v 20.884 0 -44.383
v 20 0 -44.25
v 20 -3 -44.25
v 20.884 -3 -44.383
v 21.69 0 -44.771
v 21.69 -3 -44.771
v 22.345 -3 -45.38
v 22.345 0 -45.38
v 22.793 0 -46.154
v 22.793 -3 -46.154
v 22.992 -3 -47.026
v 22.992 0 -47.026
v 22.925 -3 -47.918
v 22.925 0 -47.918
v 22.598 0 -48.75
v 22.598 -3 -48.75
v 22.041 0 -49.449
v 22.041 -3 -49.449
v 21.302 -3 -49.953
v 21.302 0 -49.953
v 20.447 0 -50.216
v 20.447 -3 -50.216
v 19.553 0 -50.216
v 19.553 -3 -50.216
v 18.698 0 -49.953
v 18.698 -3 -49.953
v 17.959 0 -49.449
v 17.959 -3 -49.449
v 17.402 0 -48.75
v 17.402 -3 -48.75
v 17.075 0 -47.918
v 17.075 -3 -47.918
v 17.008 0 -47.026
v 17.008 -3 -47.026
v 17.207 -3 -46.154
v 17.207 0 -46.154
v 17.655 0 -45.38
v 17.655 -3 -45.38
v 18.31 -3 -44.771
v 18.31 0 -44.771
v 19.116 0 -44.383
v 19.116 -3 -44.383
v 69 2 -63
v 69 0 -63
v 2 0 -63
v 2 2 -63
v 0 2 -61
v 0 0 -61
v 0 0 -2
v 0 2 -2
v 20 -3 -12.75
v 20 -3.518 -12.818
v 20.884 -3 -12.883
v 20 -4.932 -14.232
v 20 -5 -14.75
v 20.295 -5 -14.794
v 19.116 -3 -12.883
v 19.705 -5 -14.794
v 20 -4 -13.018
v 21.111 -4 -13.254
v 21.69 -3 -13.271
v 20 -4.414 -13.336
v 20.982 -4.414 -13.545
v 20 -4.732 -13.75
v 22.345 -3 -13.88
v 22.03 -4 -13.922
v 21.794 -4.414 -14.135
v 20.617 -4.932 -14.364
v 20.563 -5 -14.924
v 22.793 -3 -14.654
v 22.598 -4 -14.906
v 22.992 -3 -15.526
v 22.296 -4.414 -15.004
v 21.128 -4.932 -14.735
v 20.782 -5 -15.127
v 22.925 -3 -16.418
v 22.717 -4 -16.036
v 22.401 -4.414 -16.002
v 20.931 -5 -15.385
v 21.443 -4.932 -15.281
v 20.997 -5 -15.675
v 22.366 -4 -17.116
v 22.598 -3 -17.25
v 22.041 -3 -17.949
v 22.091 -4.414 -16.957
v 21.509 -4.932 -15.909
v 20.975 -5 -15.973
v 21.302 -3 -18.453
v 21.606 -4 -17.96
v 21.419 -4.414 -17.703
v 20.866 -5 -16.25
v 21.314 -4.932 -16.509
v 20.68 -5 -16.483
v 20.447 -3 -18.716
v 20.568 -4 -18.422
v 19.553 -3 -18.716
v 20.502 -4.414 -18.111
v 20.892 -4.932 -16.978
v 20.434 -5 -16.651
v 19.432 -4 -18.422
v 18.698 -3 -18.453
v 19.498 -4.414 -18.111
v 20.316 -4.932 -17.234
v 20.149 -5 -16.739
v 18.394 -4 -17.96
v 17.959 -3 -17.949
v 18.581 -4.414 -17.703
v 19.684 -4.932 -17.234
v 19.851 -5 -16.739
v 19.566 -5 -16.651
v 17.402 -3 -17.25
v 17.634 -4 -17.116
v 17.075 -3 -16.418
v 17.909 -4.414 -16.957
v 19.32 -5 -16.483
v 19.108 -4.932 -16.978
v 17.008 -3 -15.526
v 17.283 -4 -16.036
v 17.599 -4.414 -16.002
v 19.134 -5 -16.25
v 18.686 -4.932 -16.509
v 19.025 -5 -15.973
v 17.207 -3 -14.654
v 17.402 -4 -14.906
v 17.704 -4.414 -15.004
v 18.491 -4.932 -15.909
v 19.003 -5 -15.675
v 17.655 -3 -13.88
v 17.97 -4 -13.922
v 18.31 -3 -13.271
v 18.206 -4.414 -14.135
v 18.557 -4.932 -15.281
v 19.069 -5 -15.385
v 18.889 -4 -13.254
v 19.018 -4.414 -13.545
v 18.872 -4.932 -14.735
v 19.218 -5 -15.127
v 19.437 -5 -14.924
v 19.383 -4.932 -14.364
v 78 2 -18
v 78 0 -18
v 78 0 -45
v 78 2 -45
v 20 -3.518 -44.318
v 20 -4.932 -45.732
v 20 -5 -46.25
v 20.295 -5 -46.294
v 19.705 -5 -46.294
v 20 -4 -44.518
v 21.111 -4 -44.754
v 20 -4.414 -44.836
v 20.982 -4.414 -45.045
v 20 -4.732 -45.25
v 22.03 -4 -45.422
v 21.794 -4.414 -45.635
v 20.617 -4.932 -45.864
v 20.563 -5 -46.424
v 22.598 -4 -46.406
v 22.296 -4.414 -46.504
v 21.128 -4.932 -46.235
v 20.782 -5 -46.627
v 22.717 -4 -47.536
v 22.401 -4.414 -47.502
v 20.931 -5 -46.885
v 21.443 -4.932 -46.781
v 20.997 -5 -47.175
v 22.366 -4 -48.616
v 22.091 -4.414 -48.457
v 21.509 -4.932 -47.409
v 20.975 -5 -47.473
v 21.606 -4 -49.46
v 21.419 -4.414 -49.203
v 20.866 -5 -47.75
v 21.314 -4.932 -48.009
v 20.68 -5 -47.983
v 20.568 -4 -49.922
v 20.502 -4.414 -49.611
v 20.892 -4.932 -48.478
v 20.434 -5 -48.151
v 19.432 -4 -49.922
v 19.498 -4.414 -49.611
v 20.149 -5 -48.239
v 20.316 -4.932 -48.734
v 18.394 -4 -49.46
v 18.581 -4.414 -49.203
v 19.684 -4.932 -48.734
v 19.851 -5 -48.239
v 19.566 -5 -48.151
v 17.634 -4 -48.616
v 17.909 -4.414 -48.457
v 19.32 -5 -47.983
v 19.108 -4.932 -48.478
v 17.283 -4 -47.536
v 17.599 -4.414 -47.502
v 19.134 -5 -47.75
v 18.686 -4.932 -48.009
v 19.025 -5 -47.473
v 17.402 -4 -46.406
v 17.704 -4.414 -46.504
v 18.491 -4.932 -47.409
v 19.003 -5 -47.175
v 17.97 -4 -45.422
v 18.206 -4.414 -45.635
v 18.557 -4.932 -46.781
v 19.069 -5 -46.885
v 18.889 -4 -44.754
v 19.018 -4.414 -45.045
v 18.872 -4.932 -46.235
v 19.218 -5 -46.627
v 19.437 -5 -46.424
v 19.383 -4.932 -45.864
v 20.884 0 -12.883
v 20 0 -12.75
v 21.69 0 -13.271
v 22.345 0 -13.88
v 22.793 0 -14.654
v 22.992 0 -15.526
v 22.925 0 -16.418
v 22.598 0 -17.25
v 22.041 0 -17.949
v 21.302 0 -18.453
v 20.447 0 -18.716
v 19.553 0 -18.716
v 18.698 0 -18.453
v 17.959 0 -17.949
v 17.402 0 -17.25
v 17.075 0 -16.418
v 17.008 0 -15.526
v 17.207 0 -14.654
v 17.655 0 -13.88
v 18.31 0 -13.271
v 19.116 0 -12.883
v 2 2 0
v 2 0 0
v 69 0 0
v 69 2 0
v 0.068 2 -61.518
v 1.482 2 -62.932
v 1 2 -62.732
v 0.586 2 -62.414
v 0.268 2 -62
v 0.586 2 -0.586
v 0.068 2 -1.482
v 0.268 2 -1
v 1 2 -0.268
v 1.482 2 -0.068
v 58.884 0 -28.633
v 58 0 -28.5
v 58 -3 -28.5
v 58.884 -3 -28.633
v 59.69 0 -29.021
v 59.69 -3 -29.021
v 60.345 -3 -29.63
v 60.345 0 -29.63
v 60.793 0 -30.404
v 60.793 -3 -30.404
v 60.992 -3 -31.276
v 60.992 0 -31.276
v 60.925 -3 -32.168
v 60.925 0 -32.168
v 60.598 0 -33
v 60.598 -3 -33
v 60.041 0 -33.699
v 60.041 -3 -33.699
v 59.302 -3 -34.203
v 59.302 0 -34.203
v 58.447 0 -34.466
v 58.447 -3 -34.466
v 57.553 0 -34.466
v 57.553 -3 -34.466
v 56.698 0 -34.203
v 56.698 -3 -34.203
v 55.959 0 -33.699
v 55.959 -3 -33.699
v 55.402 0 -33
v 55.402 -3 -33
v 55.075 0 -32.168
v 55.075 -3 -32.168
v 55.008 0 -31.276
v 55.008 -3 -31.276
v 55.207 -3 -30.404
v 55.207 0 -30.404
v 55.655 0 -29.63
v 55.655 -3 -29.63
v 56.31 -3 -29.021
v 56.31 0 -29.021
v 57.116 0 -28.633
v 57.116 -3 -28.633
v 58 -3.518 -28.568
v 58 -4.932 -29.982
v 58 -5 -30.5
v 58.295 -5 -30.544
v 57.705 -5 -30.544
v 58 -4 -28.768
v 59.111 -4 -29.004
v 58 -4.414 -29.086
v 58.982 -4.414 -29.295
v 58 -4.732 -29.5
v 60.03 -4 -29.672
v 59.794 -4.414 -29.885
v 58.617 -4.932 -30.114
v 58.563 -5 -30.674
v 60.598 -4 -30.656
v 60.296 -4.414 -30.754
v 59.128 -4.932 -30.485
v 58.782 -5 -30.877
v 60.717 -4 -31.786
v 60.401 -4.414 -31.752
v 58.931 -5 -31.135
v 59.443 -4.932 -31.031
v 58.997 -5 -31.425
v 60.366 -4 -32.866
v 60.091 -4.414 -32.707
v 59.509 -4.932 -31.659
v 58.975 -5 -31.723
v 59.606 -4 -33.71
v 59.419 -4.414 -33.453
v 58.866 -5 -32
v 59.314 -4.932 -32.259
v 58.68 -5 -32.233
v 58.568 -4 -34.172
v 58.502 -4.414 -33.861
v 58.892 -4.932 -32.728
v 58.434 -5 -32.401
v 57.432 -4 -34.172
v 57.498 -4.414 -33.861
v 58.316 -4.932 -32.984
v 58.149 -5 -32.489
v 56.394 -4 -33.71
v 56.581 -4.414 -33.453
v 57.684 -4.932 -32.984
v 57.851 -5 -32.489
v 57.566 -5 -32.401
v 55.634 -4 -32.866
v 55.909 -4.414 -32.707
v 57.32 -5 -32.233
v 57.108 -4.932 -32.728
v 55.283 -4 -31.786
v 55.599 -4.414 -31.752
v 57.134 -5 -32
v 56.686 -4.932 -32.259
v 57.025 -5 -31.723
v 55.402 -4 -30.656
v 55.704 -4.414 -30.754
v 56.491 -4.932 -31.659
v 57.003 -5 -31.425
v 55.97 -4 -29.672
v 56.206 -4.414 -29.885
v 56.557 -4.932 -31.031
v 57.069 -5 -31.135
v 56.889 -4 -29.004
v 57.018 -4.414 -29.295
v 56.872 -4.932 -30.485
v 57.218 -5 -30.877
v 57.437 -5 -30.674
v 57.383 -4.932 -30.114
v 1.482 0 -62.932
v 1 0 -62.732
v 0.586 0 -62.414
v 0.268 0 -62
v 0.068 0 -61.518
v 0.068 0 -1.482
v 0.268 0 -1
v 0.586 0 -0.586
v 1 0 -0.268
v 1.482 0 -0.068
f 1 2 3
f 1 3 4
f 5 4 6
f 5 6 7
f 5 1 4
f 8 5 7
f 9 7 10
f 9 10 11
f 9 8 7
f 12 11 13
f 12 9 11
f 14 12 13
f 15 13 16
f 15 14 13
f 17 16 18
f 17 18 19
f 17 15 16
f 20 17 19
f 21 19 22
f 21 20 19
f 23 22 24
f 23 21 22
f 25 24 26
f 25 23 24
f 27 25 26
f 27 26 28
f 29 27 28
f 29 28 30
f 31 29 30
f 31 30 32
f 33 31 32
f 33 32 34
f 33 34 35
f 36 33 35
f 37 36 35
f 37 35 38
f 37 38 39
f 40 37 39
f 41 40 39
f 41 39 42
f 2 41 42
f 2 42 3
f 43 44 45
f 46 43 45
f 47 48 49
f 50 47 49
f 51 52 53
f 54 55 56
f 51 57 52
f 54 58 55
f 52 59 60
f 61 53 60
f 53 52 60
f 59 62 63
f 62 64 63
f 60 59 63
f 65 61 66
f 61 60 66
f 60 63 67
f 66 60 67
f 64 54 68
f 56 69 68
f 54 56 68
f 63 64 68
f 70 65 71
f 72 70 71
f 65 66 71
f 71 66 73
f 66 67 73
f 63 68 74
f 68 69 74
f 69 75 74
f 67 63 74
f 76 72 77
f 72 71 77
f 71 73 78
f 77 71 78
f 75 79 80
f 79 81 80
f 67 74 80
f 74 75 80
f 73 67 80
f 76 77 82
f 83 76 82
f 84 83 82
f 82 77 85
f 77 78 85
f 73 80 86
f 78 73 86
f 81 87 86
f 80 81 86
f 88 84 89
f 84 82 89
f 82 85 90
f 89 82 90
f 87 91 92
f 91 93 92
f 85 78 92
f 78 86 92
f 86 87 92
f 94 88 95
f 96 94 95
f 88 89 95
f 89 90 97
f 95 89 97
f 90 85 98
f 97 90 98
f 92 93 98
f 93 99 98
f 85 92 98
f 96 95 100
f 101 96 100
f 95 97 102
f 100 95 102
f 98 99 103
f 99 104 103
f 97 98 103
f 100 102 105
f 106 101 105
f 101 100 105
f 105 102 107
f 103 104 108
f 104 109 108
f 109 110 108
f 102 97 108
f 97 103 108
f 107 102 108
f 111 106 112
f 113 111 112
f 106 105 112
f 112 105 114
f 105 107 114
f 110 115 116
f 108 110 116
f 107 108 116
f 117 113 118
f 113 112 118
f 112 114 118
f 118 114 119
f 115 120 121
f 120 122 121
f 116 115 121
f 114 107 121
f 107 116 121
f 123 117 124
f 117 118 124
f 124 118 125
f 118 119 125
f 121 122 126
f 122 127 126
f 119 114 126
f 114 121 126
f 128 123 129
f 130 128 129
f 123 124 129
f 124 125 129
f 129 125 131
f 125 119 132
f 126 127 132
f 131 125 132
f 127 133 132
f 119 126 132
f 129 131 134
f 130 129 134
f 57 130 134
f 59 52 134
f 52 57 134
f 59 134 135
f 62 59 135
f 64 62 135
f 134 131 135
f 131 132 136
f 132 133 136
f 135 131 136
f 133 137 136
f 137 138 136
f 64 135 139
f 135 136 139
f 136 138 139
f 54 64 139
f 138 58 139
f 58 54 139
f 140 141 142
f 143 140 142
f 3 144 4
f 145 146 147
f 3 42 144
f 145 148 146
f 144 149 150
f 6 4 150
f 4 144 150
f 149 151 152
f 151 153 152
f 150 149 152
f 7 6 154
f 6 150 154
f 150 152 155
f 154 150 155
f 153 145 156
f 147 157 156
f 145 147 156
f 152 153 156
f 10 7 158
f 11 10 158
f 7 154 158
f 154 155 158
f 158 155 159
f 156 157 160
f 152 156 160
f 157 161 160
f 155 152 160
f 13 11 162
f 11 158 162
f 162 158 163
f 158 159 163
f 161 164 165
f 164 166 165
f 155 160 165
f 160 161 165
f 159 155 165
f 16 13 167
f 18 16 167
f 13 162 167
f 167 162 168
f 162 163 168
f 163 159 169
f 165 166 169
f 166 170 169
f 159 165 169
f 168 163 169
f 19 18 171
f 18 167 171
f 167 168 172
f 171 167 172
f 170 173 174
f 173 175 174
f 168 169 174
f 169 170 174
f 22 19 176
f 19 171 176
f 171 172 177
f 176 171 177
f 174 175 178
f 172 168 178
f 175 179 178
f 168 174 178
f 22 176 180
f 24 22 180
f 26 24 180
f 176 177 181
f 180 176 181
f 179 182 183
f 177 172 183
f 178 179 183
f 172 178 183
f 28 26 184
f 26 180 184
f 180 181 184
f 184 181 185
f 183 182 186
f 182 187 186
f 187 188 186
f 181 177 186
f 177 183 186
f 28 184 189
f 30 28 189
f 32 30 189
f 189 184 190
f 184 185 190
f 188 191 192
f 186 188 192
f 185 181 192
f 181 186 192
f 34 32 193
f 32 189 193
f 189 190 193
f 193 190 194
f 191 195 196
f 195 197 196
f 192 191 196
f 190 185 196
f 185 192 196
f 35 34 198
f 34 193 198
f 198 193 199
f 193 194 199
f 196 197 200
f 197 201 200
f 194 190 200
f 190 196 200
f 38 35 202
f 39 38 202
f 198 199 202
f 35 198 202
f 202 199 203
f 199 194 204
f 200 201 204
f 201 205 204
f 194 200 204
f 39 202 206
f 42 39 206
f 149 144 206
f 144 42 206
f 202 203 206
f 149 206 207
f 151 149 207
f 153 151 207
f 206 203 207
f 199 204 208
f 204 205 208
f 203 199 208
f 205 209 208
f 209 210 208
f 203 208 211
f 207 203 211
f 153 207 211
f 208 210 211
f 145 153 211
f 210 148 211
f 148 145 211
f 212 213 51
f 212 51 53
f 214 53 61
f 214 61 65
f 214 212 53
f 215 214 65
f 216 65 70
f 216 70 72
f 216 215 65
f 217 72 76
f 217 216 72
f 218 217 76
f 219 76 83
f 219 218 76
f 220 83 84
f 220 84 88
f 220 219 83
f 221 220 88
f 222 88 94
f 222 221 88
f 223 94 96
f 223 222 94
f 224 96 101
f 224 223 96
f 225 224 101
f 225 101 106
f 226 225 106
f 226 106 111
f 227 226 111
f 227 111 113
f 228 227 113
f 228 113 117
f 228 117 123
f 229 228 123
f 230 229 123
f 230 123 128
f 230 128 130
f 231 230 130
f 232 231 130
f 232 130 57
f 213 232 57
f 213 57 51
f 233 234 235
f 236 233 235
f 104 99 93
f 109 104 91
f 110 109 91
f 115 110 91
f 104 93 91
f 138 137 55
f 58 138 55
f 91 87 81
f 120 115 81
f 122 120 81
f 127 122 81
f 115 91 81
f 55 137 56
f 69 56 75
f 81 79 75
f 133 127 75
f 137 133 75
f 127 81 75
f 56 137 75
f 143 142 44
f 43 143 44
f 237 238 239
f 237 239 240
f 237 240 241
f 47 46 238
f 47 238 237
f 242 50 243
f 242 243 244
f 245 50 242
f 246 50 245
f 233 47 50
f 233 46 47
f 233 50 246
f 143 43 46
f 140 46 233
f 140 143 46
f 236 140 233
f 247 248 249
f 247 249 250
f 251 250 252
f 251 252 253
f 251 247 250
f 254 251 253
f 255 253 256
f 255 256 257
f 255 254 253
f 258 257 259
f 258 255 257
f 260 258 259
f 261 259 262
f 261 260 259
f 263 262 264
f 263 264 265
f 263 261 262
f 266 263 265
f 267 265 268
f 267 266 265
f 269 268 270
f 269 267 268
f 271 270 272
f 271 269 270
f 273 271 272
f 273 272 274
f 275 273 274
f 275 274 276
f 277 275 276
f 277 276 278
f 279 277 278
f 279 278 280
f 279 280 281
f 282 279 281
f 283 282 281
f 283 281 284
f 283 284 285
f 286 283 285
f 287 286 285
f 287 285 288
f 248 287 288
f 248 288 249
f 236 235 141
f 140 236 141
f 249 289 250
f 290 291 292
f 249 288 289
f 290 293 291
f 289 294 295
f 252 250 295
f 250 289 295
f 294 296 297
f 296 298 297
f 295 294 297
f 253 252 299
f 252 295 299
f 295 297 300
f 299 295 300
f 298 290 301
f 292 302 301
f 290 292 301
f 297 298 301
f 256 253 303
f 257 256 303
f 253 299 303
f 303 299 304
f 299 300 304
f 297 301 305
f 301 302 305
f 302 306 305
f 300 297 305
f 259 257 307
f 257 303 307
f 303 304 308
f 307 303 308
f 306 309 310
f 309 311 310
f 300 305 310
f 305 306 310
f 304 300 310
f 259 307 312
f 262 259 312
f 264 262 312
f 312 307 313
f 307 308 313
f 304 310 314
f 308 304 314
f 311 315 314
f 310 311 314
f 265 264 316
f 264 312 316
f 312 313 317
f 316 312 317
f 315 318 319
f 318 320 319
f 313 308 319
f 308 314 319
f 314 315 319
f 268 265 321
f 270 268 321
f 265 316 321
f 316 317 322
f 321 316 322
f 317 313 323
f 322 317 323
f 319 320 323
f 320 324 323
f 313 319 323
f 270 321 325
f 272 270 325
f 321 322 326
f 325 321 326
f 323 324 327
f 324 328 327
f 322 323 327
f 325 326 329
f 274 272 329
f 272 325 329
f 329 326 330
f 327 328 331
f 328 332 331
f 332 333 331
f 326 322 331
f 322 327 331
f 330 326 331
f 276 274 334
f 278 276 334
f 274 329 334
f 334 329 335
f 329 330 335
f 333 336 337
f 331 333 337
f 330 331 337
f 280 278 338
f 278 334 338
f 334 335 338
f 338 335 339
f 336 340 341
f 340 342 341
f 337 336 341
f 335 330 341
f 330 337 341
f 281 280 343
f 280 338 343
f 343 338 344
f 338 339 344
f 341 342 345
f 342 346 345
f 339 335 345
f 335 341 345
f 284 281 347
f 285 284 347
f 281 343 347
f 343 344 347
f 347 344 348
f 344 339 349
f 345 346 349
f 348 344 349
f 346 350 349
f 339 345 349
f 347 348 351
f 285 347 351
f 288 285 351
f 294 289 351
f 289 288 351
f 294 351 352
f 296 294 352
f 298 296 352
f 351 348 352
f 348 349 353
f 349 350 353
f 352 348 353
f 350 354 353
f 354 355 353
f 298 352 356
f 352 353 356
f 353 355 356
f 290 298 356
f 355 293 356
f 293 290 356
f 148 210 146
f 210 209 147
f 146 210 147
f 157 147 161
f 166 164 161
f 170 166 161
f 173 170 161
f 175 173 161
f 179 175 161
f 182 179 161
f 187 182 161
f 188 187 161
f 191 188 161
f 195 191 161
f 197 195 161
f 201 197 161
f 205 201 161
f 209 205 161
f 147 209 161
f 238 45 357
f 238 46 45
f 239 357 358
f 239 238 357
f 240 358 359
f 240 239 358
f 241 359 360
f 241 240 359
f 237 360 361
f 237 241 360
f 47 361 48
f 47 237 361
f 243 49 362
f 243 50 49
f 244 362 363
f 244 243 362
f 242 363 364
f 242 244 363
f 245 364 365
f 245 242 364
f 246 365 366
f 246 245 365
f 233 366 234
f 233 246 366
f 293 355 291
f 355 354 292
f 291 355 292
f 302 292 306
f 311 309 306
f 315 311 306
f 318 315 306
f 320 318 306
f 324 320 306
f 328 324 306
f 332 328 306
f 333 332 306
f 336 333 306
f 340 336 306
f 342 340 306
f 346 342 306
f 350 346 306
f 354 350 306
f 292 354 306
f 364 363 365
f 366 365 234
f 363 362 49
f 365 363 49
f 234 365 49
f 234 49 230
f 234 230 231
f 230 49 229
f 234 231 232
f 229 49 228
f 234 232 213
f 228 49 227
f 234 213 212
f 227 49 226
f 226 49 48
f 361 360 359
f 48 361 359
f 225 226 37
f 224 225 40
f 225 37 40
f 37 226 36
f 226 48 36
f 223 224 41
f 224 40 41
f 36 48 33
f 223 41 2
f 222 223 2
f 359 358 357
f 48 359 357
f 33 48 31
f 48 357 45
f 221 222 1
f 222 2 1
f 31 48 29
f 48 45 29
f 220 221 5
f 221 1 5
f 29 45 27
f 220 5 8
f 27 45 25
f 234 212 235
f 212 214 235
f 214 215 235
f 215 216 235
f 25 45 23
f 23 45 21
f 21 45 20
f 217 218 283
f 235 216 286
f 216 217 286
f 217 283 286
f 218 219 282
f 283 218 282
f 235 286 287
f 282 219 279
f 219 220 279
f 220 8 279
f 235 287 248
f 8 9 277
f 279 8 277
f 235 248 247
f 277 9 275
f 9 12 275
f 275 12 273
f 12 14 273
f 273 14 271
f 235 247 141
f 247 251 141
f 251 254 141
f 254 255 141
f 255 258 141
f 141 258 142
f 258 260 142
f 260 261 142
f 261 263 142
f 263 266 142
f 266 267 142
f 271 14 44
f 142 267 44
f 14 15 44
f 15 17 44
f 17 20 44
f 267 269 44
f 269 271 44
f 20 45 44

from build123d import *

# Parameters (mm, degrees)
SALIENTE_EXTRUIR1_DEPTH = 2
REDONDEO1_R             = 2
CROQUIS4_R              = 3
SALIENTE_EXTRUIR2_DEPTH = 7
REDONDEO2_R             = 2


with BuildPart() as part:
    # Croquis1 → Saliente-Extruir1 (new body)
    with BuildSketch(Plane(origin=(0, 0, 0), x_dir=(1, 0, 0), z_dir=(0, 1, 0))):
        Polygon((63, 0), (69, 0), (78, 18), (78, 45), (69, 63), (63, 63), (0, 63), (0, 0), align=None)
    extrude(amount=SALIENTE_EXTRUIR1_DEPTH)

    # Redondeo1
    redondeo1_edges = [part.edges().sort_by_distance(p)[0] for p in [
        (0, 1, -63),
        (0, 1, 0),
    ]]
    fillet(redondeo1_edges, radius=REDONDEO1_R)

    # Croquis4 → Saliente-Extruir2 (add)
    with BuildSketch(Plane(origin=(0, 2, 0), x_dir=(1, 0, 0), z_dir=(0, 1, 0))):
        with Locations(Location((20, 47.25, 0), (0, 0, 270))):
            Circle(CROQUIS4_R)
        with Locations(Location((20, 15.75, 0), (0, 0, 270))):
            Circle(CROQUIS4_R)
        with Locations(Location((58, 31.5, 0), (0, 0, 270))):
            Circle(CROQUIS4_R)
    extrude(amount=-SALIENTE_EXTRUIR2_DEPTH)

    # Redondeo2
    redondeo2_edges = [part.edges().sort_by_distance(p)[0] for p in [
        (20, -5, -50.25),
        (20, -5, -18.75),
        (58, -5, -34.5),
    ]]
    fillet(redondeo2_edges, radius=REDONDEO2_R)


solid = part.part
